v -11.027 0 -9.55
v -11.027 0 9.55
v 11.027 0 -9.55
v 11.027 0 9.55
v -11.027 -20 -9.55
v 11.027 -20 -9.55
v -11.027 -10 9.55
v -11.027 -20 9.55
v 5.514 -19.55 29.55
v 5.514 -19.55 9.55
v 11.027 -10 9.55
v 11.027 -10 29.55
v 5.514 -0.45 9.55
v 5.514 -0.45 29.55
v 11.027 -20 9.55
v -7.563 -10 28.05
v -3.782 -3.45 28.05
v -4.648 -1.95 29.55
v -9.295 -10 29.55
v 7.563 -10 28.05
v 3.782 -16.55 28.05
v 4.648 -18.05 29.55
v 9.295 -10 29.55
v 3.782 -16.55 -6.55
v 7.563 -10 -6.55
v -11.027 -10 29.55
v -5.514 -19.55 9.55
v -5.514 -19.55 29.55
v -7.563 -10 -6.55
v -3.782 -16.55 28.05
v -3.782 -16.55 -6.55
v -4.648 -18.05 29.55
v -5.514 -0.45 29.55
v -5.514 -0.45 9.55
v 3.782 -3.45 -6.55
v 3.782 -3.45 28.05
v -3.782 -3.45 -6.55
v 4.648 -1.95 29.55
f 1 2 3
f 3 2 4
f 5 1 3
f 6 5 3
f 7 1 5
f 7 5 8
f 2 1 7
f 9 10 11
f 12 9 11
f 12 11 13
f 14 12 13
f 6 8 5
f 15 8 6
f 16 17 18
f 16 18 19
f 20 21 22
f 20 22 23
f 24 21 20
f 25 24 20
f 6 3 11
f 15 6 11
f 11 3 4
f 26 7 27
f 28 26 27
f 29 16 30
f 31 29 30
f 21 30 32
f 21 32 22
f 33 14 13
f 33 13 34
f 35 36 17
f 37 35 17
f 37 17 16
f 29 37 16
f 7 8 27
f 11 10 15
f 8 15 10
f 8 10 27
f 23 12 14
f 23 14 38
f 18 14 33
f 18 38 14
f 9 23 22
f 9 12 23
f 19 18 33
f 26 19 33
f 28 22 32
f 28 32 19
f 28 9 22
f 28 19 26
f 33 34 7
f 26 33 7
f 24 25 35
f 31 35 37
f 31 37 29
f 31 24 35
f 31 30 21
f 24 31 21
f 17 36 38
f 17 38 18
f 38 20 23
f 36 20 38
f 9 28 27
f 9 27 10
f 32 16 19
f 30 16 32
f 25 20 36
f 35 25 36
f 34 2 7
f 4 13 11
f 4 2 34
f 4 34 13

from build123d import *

# Parameters (mm, degrees)
SKETCH_W     = 22.05478
SKETCH_H     = 19.1
PAD_DEPTH    = 20
PAD001_DEPTH = 20
POCKET_DEPTH = 36.1
CHAMFER_SIZE = 1.5


with BuildPart() as part:
    # Sketch → Pad (new body)
    with BuildSketch(Plane.XZ):
        Rectangle(SKETCH_W, SKETCH_H)
    extrude(amount=PAD_DEPTH)

    # Sketch001 (on DatumPlane) → Pad001 (join)
    with BuildSketch(Plane(origin=(0, 0, 9.55), x_dir=(-1, 0, 0), z_dir=(0, 0, 1))):
        Polygon((-5.513695, 19.55), (-11.02739, 10), (-5.513695, 0.45), (5.513695, 0.45), (11.02739, 10), (5.513695, 19.55), align=None)
    extrude(amount=PAD001_DEPTH)

    # Sketch002 (on Face14 of Pad001) → Pocket (cut)
    with BuildSketch(Plane(origin=(0, 0, 29.55), x_dir=(-1, 0, 0), z_dir=(0, 0, 1))):
        Polygon((3.781644, 16.55), (-3.781644, 16.55), (-7.563289, 10), (-3.781644, 3.45), (3.781644, 3.45), (7.563289, 10), align=None)
    extrude(amount=-POCKET_DEPTH, mode=Mode.SUBTRACT)

    # Chamfer
    chamfer_edges = [part.edges().sort_by_distance(p)[0] for p in [
        (-5.672466, -6.725, 29.55),
        (-5.672466, -13.275, 29.55),
        (0, -3.45, 29.55),
        (5.672466, -6.725, 29.55),
        (5.672466, -13.275, 29.55),
        (0, -16.55, 29.55),
    ]]
    chamfer(chamfer_edges, length=CHAMFER_SIZE)


solid = part.part
